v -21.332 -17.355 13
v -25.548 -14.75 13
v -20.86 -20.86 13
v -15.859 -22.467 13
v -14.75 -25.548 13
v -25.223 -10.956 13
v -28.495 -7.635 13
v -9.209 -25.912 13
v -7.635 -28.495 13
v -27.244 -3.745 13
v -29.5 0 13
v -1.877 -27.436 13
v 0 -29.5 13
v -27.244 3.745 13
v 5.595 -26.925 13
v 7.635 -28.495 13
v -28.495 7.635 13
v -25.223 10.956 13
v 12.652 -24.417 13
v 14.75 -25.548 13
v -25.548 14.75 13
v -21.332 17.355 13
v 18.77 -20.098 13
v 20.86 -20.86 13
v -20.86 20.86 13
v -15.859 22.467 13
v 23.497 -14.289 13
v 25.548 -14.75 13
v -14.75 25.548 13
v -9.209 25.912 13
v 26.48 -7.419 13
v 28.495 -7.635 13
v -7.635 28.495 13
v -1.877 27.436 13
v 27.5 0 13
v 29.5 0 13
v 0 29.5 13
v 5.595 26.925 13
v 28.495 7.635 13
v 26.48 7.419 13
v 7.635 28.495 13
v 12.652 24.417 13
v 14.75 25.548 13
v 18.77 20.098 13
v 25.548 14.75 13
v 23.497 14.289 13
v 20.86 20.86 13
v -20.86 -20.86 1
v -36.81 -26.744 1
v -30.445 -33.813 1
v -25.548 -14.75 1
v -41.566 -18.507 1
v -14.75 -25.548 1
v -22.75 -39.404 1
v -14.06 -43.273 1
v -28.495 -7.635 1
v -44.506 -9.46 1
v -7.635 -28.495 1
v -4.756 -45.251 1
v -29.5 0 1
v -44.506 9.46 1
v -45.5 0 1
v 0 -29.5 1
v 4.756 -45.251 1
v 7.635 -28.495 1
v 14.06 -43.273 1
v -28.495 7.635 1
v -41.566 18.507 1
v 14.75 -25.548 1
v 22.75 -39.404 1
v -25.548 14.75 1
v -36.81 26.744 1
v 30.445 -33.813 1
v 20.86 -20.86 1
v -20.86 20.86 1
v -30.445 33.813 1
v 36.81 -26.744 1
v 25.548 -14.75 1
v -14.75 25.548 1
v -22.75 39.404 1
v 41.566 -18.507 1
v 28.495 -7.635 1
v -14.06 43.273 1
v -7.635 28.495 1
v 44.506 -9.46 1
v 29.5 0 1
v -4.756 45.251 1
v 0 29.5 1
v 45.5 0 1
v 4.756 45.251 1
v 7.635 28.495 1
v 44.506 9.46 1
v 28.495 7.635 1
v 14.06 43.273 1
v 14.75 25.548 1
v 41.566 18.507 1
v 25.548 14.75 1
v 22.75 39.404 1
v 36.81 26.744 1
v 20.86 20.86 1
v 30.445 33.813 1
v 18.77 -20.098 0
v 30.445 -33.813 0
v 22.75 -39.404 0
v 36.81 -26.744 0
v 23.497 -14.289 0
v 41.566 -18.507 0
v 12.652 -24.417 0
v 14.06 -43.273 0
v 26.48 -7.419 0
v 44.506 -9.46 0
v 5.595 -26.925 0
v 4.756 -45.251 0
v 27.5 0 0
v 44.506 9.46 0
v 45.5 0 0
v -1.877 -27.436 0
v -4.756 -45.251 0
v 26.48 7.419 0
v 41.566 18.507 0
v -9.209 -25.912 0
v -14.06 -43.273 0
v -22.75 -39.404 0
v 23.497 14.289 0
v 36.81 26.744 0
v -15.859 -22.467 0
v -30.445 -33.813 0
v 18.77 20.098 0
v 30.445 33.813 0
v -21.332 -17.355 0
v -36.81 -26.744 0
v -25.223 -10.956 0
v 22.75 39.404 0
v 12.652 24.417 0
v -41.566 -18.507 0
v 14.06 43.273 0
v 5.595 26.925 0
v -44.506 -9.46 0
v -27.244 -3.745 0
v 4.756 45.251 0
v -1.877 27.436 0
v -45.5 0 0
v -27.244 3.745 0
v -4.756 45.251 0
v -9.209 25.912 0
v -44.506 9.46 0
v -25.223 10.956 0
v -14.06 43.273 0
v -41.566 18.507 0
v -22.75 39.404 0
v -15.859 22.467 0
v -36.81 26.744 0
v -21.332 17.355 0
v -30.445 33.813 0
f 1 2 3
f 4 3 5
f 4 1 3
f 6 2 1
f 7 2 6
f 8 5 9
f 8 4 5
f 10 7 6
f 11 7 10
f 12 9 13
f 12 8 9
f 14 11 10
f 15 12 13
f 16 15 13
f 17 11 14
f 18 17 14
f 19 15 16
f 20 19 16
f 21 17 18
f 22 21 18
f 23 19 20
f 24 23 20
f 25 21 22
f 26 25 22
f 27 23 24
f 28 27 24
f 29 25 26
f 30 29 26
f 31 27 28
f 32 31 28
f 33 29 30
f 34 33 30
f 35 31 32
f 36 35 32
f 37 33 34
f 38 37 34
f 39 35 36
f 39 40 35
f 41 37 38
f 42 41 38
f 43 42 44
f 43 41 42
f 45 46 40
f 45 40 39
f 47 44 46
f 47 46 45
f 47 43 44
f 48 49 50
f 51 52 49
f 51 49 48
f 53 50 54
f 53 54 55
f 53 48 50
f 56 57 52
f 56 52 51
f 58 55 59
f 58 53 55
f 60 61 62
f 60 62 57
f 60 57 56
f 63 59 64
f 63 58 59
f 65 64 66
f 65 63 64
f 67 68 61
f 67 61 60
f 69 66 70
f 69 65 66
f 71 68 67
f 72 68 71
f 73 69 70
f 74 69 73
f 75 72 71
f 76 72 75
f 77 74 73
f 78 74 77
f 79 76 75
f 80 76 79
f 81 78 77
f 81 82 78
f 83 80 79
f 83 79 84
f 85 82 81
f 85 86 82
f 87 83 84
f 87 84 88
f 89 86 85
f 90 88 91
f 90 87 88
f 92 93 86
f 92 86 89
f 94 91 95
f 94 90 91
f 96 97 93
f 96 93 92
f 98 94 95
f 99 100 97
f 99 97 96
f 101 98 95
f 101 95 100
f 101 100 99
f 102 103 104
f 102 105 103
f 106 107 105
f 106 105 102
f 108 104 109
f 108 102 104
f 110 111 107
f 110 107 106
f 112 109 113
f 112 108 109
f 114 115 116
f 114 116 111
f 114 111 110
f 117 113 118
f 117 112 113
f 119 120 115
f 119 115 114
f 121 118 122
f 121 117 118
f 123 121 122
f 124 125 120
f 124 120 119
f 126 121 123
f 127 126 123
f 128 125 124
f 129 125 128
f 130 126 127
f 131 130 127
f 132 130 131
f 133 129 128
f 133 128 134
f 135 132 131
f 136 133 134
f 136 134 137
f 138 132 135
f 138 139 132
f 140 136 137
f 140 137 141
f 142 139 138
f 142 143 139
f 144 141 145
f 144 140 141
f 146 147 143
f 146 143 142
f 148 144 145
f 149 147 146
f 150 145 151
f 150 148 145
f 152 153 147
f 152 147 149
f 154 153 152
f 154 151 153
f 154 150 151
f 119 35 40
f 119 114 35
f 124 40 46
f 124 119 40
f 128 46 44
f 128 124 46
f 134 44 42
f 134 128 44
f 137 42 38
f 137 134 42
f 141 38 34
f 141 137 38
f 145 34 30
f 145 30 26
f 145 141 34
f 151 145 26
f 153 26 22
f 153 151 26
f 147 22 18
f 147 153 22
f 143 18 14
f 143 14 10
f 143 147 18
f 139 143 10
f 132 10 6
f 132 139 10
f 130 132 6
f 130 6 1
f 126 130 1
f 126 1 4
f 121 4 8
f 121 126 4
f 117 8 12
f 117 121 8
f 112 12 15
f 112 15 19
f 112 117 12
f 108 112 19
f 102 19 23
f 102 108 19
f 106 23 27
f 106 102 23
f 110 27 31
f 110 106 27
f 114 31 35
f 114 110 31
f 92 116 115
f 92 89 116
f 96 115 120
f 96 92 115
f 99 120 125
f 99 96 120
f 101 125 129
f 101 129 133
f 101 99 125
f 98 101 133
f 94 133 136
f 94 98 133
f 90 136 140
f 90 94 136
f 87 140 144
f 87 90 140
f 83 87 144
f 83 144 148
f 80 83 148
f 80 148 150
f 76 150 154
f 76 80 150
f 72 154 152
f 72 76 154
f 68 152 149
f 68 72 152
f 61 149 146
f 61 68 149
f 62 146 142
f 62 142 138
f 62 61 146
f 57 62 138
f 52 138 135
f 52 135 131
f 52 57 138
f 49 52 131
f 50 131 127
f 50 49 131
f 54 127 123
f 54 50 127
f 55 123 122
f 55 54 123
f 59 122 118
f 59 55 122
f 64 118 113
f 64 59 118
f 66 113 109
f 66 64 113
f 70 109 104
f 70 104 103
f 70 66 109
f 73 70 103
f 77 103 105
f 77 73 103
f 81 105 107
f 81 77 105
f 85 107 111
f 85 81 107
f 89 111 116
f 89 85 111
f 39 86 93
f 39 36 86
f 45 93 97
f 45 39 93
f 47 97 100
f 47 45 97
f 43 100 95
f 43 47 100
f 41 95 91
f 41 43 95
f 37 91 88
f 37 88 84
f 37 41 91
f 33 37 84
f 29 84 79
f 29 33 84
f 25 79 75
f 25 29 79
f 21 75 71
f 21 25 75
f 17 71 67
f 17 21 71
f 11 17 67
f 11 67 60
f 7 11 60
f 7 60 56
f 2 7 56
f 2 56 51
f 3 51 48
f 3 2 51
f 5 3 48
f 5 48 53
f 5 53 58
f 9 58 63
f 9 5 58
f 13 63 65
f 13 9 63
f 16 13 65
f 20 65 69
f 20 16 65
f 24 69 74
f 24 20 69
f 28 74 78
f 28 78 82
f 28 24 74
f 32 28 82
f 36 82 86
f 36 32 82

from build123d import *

# Parameters (mm, degrees)
REVOLVE_ONTO_SKETCH_ROLL_ANGLE = 90


with BuildPart() as part:
    # Sketch as drawn → Revolve (revolve)
    with BuildSketch(Plane.XY):
        Polygon((27.5, 0), (45.5, 0), (45.5, 1), (29.5, 1), (29.5, 13), (27.5, 13), align=None)
    revolve(axis=Axis((0, 0, 0), (0, 1, 0)))


with BuildPart() as part_1:
    # Revolve onto Sketch roll: moved
    add(part.part.rotate(Axis((0, 0, 0), (1, 0, 0)), REVOLVE_ONTO_SKETCH_ROLL_ANGLE))


with BuildPart() as part_2:
    # Revolve onto Sketch placement: moved
    add(part_1.part)


solid = part_2.part
